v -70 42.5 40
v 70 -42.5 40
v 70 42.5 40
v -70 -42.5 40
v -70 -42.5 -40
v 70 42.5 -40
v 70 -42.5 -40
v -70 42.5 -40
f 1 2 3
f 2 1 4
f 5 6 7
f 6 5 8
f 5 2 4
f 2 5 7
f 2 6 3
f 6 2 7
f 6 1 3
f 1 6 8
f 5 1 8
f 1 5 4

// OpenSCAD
// ========================================
// a 140 x 85 x 80 mm box
// NeuroCAD canonical IR; dimensions are millimetres
// ========================================
$fn = 48;

cube(size=[140, 85, 80], center=true);
